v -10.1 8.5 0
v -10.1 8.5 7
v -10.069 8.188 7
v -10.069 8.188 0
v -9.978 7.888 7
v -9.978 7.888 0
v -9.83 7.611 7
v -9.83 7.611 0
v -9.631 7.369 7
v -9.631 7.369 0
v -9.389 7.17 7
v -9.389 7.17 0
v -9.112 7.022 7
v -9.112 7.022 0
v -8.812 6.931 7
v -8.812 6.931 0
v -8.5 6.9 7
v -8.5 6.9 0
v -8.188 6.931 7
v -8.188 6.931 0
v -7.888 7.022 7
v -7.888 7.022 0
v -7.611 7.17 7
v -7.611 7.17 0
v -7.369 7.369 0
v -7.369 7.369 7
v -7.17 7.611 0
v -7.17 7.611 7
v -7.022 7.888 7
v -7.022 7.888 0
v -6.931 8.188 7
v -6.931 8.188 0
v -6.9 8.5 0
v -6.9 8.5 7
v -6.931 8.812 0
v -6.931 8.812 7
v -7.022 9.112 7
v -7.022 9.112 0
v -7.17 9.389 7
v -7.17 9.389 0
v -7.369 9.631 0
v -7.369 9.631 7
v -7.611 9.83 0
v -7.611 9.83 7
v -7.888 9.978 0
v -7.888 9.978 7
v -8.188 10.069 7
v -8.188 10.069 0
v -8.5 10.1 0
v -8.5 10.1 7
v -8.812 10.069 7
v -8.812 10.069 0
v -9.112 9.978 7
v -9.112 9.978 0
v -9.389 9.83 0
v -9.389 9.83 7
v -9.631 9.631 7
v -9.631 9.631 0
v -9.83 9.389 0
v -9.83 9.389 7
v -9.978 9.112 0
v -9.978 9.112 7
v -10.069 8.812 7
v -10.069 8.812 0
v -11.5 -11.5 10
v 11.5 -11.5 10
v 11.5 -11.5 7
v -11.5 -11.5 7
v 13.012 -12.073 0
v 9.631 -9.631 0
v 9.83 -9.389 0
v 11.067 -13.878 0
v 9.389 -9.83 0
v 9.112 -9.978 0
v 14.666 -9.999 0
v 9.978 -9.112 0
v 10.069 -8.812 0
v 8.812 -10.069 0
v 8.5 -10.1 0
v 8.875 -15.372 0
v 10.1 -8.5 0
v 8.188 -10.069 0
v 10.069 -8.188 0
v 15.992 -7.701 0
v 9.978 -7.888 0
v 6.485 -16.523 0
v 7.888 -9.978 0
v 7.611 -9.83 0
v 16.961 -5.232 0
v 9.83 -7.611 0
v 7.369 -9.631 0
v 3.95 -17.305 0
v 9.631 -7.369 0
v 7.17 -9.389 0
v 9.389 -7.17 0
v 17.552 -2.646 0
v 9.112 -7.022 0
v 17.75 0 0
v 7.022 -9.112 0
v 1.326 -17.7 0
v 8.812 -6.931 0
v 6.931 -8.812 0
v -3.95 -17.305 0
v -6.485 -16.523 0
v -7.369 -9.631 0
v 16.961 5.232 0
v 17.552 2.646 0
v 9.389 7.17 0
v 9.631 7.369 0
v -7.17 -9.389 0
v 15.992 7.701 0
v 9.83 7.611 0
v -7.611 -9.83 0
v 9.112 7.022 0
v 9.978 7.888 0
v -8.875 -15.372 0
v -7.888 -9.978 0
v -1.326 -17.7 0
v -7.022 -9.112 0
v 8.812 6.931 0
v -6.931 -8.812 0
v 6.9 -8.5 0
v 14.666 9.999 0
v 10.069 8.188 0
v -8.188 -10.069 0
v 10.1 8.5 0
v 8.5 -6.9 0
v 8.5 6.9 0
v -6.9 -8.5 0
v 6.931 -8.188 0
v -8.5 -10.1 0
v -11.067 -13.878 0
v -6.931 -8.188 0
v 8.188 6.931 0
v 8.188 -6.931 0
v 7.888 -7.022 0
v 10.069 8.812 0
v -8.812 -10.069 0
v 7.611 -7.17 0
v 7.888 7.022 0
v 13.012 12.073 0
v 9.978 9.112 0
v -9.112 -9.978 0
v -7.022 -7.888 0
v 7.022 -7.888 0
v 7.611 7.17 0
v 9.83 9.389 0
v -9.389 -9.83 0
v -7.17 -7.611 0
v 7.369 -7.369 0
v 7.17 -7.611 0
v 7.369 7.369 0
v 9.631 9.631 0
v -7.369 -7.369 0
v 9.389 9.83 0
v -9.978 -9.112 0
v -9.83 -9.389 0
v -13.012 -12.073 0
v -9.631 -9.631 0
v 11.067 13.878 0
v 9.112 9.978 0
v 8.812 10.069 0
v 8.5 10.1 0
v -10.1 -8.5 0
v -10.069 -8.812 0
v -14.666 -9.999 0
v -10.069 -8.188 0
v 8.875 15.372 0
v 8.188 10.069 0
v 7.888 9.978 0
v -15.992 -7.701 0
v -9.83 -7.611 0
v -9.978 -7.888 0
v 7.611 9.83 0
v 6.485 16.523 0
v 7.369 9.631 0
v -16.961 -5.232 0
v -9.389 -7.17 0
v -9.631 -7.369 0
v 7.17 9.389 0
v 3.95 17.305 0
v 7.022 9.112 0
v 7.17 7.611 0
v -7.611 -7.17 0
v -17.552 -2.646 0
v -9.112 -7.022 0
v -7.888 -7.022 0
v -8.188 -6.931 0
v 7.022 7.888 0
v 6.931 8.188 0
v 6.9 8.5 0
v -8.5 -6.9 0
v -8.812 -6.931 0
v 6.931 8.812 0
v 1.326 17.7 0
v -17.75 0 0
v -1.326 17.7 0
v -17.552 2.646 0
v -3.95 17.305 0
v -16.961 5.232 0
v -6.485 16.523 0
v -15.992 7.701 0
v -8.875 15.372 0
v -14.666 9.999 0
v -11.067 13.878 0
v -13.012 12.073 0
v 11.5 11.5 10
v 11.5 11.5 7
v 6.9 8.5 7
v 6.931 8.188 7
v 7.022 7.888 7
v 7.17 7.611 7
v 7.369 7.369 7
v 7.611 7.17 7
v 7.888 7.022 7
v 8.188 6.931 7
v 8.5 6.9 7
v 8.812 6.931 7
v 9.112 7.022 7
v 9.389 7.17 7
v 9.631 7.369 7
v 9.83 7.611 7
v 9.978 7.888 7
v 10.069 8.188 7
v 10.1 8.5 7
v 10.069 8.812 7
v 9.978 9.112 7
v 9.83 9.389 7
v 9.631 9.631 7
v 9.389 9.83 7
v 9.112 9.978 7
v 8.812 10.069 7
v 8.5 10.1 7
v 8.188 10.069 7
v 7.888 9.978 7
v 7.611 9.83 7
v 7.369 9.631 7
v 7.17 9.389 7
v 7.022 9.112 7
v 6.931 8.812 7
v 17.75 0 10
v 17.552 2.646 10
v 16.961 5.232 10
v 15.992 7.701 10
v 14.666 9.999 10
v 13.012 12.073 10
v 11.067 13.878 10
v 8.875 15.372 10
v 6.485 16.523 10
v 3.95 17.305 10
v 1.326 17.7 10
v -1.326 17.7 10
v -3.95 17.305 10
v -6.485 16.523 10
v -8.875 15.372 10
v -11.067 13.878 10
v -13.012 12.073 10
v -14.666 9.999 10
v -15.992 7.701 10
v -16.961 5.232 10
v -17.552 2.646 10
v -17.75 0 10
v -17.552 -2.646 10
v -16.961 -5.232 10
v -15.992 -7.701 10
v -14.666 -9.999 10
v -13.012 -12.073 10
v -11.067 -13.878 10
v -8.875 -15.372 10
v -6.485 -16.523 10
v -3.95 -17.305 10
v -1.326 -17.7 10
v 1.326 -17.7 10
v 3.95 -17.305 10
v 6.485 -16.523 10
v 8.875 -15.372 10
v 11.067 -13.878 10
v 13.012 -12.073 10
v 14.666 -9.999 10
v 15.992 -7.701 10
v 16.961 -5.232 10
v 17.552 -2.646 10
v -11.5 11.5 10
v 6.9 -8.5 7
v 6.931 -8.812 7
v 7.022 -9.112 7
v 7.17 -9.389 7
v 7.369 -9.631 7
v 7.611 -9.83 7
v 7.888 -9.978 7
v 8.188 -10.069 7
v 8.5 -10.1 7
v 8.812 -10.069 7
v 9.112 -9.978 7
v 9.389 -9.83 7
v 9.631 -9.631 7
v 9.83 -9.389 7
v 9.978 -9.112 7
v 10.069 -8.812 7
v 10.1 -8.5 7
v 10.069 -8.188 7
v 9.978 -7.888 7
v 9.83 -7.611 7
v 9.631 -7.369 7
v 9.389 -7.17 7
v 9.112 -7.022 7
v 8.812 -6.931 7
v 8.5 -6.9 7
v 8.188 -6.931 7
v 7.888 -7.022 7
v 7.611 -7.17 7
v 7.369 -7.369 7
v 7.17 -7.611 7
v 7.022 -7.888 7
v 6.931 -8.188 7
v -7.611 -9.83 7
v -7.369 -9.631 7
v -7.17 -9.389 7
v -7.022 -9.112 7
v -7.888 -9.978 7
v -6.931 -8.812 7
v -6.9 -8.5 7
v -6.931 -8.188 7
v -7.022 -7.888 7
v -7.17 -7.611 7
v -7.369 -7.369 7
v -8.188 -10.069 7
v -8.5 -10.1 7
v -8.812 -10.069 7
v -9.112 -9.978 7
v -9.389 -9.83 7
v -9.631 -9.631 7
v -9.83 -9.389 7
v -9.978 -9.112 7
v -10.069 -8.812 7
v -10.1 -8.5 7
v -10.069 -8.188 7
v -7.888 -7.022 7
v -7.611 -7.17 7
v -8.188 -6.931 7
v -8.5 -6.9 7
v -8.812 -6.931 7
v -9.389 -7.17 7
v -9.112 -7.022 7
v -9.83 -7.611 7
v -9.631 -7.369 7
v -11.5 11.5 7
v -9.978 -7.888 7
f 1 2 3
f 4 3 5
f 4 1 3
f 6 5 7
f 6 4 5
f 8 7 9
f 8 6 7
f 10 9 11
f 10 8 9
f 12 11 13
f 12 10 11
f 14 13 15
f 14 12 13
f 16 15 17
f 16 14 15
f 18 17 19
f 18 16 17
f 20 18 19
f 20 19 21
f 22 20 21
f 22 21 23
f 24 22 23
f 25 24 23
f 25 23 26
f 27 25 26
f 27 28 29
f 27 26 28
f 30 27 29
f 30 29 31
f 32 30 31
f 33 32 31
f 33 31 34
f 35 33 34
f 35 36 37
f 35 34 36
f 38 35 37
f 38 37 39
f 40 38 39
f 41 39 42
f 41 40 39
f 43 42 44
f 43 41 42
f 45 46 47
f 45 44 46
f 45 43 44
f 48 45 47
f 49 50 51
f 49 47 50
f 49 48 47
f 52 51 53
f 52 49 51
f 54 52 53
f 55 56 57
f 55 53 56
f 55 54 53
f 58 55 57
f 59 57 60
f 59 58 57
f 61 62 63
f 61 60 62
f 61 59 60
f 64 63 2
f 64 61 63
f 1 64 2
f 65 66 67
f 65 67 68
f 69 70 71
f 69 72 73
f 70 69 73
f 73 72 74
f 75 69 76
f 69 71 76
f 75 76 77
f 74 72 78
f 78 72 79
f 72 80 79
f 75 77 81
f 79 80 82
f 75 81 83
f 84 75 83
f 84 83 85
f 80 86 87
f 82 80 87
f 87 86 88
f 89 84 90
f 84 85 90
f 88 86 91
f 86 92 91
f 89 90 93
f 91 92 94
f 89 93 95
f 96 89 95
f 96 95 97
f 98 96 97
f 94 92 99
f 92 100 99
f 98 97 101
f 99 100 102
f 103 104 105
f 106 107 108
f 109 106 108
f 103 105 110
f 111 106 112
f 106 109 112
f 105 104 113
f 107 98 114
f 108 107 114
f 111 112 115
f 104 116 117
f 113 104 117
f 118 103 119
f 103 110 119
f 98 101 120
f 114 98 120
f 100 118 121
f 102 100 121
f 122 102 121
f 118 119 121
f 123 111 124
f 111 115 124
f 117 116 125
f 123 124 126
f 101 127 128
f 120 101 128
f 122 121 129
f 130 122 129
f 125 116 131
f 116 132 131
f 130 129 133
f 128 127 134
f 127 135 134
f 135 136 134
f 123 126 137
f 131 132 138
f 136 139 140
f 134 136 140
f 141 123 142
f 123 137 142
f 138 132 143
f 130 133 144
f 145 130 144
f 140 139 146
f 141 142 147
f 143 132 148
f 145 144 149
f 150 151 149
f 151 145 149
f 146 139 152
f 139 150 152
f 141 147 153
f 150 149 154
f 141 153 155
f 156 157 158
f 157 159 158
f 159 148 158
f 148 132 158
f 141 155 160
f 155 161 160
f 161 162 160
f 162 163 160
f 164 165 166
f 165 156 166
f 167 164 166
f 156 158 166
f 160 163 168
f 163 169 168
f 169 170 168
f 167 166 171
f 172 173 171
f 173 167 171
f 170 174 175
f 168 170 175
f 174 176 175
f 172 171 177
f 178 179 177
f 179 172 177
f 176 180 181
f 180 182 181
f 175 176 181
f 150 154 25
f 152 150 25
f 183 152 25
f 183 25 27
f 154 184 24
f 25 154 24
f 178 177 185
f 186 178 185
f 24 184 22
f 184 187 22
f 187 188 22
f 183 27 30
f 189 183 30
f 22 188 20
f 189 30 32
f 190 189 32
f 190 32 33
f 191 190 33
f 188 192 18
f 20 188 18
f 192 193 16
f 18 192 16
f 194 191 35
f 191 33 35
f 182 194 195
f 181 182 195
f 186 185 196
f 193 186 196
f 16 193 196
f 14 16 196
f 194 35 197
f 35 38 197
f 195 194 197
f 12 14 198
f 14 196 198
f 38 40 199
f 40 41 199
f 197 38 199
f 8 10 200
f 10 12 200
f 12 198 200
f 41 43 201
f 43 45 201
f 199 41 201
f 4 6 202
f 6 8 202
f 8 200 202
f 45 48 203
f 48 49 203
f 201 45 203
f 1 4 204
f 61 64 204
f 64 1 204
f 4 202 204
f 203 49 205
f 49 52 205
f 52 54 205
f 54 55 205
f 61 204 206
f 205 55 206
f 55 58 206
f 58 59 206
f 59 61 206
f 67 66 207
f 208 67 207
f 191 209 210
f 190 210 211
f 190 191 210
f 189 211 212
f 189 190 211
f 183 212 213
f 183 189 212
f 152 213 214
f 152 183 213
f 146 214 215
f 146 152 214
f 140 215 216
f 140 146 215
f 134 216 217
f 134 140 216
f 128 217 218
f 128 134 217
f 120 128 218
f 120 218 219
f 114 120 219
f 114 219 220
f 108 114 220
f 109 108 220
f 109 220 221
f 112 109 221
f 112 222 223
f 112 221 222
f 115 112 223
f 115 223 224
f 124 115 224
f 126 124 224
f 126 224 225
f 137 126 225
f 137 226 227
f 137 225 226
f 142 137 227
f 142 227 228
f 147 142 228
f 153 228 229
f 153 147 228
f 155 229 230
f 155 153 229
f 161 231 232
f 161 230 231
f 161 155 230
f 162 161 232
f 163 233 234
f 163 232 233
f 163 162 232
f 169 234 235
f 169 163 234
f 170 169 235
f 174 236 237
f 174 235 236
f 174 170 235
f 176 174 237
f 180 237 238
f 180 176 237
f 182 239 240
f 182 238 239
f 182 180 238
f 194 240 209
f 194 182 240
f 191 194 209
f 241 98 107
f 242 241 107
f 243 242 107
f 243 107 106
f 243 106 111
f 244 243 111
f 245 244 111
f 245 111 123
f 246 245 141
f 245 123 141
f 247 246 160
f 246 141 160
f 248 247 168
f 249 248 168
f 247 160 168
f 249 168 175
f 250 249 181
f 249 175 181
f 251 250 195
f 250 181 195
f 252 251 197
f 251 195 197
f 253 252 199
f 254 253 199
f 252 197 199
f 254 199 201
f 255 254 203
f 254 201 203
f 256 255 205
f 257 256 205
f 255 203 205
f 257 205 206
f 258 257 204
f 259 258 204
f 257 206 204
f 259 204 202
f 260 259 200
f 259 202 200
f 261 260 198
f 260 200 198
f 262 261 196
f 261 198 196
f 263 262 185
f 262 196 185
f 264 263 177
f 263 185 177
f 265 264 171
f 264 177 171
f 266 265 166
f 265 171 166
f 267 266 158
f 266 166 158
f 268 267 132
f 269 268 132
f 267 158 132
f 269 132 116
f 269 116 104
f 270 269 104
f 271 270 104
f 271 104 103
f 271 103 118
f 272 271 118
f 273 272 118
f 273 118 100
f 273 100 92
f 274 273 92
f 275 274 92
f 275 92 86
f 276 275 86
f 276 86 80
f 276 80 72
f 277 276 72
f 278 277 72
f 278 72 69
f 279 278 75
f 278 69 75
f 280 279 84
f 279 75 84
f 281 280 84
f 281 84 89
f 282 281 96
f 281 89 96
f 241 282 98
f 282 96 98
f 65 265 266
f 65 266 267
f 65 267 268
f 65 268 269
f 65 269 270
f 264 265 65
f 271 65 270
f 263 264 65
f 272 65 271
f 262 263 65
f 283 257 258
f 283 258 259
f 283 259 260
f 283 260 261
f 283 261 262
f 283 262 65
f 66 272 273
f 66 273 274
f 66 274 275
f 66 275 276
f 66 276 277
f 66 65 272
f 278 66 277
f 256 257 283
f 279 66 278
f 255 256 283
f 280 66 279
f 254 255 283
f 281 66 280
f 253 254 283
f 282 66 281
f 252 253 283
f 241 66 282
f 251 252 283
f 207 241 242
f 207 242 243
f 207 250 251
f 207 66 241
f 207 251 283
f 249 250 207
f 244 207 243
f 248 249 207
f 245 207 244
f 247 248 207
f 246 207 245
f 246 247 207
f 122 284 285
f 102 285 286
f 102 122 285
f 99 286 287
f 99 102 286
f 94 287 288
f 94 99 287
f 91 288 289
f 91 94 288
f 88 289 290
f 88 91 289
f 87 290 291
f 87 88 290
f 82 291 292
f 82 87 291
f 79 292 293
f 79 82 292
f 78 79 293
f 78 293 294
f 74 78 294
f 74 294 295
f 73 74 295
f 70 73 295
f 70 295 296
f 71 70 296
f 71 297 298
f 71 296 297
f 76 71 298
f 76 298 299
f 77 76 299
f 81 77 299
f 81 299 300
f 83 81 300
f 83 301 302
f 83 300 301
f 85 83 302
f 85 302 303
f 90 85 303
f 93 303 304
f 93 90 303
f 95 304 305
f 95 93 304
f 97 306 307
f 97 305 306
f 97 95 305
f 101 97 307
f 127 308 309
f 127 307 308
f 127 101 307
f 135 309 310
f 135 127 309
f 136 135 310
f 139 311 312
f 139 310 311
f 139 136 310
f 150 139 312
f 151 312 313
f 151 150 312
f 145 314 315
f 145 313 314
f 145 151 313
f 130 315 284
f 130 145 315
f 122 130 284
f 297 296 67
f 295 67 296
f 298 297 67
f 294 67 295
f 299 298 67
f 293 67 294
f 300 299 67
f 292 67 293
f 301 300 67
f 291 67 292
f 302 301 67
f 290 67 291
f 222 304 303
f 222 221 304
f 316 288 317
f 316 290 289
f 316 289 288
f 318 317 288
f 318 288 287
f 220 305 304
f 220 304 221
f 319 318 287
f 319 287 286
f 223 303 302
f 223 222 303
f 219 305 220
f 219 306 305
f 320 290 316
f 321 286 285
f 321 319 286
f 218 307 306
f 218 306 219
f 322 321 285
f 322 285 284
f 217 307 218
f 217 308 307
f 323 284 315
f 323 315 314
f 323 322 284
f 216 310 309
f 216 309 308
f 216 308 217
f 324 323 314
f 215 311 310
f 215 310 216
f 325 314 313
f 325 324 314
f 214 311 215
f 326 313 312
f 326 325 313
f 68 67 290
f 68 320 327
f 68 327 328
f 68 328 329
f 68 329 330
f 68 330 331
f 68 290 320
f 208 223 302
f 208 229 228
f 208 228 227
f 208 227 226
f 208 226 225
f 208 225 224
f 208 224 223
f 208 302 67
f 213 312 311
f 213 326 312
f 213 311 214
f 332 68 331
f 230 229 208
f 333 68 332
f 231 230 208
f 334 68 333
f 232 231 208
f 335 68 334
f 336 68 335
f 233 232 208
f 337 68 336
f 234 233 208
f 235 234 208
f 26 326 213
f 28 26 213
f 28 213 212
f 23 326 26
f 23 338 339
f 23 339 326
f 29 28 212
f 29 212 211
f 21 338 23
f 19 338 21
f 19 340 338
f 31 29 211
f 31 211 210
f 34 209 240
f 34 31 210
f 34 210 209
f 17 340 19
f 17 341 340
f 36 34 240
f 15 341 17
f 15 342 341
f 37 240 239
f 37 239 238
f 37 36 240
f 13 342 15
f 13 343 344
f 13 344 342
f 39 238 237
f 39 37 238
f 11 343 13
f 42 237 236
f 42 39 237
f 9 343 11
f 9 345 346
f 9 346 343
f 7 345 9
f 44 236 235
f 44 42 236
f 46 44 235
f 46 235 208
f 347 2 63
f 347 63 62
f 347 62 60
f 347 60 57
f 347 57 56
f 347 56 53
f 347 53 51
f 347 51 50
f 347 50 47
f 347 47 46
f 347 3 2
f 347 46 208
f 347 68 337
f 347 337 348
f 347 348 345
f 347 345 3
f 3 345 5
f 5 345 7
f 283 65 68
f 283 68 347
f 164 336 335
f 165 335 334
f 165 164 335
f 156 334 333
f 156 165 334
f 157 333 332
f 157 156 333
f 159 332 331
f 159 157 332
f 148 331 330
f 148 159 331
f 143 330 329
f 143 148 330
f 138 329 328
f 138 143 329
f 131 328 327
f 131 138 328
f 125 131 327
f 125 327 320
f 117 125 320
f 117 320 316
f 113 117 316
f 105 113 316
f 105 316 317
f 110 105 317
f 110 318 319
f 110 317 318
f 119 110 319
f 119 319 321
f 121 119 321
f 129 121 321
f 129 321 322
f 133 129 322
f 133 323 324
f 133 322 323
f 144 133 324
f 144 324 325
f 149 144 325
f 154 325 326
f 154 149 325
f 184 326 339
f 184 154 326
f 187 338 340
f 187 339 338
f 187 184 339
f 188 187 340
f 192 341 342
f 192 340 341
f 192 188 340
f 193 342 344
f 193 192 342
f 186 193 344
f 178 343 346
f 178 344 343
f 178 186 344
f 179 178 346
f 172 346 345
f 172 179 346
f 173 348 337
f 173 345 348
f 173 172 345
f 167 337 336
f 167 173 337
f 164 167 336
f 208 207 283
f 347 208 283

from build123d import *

# Parameters (mm, degrees)
SKETCH1_R           = 17.75
SKETCH1_W           = 23
SKETCH1_H           = 23
SKETCH1_R_2         = 1.6
BOSS_EXTRUDE1_DEPTH = 10
CUT_EXTRUDE1_START  = 10
SKETCH1_3_W         = 23
SKETCH1_3_H         = 23
SKETCH1_3_R         = 1.6
CUT_EXTRUDE1_DEPTH  = 3
SKETCH1_4_R         = 1.6
CUT_EXTRUDE3_DEPTH  = 28.020825302


with BuildPart() as part:
    # Sketch1 → Boss-Extrude1 (new body)
    # profile 1 of 6: a face of its own
    with BuildSketch(Plane(origin=(0, 0, 0), x_dir=(0, 1, 0), z_dir=(0, 0, 1))):
        with Locations(Location((0, 0, 0), (0, 0, 270))):
            Circle(SKETCH1_R)
        Rectangle(SKETCH1_W, SKETCH1_H, mode=Mode.SUBTRACT)
    # profile 2 of 6: a face of its own
    with BuildSketch(Plane(origin=(0, 0, 0), x_dir=(0, 1, 0), z_dir=(0, 0, 1))):
        Rectangle(SKETCH1_W, SKETCH1_H)
        with Locations((-8.5, -8.5)):
            Circle(SKETCH1_R_2, mode=Mode.SUBTRACT)
        with Locations((8.5, -8.5)):
            Circle(SKETCH1_R_2, mode=Mode.SUBTRACT)
        with Locations((8.5, 8.5)):
            Circle(SKETCH1_R_2, mode=Mode.SUBTRACT)
        with Locations((-8.5, 8.5)):
            Circle(SKETCH1_R_2, mode=Mode.SUBTRACT)
    # profile 3 of 6: a face of its own
    with BuildSketch(Plane(origin=(0, 0, 0), x_dir=(0, 1, 0), z_dir=(0, 0, 1))):
        with Locations((8.5, 8.5)):
            Circle(SKETCH1_R_2)
    # profile 4 of 6: a face of its own
    with BuildSketch(Plane(origin=(0, 0, 0), x_dir=(0, 1, 0), z_dir=(0, 0, 1))):
        with Locations((-8.5, 8.5)):
            Circle(SKETCH1_R_2)
    # profile 5 of 6: a face of its own
    with BuildSketch(Plane(origin=(0, 0, 0), x_dir=(0, 1, 0), z_dir=(0, 0, 1))):
        with Locations((8.5, -8.5)):
            Circle(SKETCH1_R_2)
    # profile 6 of 6: a face of its own
    with BuildSketch(Plane(origin=(0, 0, 0), x_dir=(0, 1, 0), z_dir=(0, 0, 1))):
        with Locations((-8.5, -8.5)):
            Circle(SKETCH1_R_2)
    extrude(amount=BOSS_EXTRUDE1_DEPTH)

    # Sketch1<3> → Cut-Extrude1 (cut)
    # profile 1 of 5: a face of its own
    with BuildSketch(Plane(origin=(0, 0, 0), x_dir=(0, 1, 0), z_dir=(0, 0, 1)).offset(CUT_EXTRUDE1_START)):
        Rectangle(SKETCH1_3_W, SKETCH1_3_H)
        with Locations((-8.5, -8.5)):
            Circle(SKETCH1_3_R, mode=Mode.SUBTRACT)
        with Locations((8.5, -8.5)):
            Circle(SKETCH1_3_R, mode=Mode.SUBTRACT)
        with Locations((8.5, 8.5)):
            Circle(SKETCH1_3_R, mode=Mode.SUBTRACT)
        with Locations((-8.5, 8.5)):
            Circle(SKETCH1_3_R, mode=Mode.SUBTRACT)
    # profile 2 of 5: a face of its own
    with BuildSketch(Plane(origin=(0, 0, 0), x_dir=(0, 1, 0), z_dir=(0, 0, 1)).offset(CUT_EXTRUDE1_START)):
        with Locations((-8.5, 8.5)):
            Circle(SKETCH1_3_R)
    # profile 3 of 5: a face of its own
    with BuildSketch(Plane(origin=(0, 0, 0), x_dir=(0, 1, 0), z_dir=(0, 0, 1)).offset(CUT_EXTRUDE1_START)):
        with Locations((8.5, 8.5)):
            Circle(SKETCH1_3_R)
    # profile 4 of 5: a face of its own
    with BuildSketch(Plane(origin=(0, 0, 0), x_dir=(0, 1, 0), z_dir=(0, 0, 1)).offset(CUT_EXTRUDE1_START)):
        with Locations((-8.5, -8.5)):
            Circle(SKETCH1_3_R)
    # profile 5 of 5: a face of its own
    with BuildSketch(Plane(origin=(0, 0, 0), x_dir=(0, 1, 0), z_dir=(0, 0, 1)).offset(CUT_EXTRUDE1_START)):
        with Locations((8.5, -8.5)):
            Circle(SKETCH1_3_R)
    extrude(amount=-CUT_EXTRUDE1_DEPTH, mode=Mode.SUBTRACT)

    # Sketch1<4> → Cut-Extrude3 (cut, through all)
    with BuildSketch(Plane(origin=(0, 0, 0), x_dir=(0, 1, 0), z_dir=(0, 0, 1))):
        with Locations(Location((-8.5, -8.5, 0), (0, 0, 90))):
            Circle(SKETCH1_4_R)
        with Locations(Location((8.5, -8.5, 0), (0, 0, 90))):
            Circle(SKETCH1_4_R)
        with Locations(Location((8.5, 8.5, 0), (0, 0, 90))):
            Circle(SKETCH1_4_R)
        with Locations(Location((-8.5, 8.5, 0), (0, 0, 90))):
            Circle(SKETCH1_4_R)
    extrude(amount=CUT_EXTRUDE3_DEPTH, mode=Mode.SUBTRACT)


solid = part.part
